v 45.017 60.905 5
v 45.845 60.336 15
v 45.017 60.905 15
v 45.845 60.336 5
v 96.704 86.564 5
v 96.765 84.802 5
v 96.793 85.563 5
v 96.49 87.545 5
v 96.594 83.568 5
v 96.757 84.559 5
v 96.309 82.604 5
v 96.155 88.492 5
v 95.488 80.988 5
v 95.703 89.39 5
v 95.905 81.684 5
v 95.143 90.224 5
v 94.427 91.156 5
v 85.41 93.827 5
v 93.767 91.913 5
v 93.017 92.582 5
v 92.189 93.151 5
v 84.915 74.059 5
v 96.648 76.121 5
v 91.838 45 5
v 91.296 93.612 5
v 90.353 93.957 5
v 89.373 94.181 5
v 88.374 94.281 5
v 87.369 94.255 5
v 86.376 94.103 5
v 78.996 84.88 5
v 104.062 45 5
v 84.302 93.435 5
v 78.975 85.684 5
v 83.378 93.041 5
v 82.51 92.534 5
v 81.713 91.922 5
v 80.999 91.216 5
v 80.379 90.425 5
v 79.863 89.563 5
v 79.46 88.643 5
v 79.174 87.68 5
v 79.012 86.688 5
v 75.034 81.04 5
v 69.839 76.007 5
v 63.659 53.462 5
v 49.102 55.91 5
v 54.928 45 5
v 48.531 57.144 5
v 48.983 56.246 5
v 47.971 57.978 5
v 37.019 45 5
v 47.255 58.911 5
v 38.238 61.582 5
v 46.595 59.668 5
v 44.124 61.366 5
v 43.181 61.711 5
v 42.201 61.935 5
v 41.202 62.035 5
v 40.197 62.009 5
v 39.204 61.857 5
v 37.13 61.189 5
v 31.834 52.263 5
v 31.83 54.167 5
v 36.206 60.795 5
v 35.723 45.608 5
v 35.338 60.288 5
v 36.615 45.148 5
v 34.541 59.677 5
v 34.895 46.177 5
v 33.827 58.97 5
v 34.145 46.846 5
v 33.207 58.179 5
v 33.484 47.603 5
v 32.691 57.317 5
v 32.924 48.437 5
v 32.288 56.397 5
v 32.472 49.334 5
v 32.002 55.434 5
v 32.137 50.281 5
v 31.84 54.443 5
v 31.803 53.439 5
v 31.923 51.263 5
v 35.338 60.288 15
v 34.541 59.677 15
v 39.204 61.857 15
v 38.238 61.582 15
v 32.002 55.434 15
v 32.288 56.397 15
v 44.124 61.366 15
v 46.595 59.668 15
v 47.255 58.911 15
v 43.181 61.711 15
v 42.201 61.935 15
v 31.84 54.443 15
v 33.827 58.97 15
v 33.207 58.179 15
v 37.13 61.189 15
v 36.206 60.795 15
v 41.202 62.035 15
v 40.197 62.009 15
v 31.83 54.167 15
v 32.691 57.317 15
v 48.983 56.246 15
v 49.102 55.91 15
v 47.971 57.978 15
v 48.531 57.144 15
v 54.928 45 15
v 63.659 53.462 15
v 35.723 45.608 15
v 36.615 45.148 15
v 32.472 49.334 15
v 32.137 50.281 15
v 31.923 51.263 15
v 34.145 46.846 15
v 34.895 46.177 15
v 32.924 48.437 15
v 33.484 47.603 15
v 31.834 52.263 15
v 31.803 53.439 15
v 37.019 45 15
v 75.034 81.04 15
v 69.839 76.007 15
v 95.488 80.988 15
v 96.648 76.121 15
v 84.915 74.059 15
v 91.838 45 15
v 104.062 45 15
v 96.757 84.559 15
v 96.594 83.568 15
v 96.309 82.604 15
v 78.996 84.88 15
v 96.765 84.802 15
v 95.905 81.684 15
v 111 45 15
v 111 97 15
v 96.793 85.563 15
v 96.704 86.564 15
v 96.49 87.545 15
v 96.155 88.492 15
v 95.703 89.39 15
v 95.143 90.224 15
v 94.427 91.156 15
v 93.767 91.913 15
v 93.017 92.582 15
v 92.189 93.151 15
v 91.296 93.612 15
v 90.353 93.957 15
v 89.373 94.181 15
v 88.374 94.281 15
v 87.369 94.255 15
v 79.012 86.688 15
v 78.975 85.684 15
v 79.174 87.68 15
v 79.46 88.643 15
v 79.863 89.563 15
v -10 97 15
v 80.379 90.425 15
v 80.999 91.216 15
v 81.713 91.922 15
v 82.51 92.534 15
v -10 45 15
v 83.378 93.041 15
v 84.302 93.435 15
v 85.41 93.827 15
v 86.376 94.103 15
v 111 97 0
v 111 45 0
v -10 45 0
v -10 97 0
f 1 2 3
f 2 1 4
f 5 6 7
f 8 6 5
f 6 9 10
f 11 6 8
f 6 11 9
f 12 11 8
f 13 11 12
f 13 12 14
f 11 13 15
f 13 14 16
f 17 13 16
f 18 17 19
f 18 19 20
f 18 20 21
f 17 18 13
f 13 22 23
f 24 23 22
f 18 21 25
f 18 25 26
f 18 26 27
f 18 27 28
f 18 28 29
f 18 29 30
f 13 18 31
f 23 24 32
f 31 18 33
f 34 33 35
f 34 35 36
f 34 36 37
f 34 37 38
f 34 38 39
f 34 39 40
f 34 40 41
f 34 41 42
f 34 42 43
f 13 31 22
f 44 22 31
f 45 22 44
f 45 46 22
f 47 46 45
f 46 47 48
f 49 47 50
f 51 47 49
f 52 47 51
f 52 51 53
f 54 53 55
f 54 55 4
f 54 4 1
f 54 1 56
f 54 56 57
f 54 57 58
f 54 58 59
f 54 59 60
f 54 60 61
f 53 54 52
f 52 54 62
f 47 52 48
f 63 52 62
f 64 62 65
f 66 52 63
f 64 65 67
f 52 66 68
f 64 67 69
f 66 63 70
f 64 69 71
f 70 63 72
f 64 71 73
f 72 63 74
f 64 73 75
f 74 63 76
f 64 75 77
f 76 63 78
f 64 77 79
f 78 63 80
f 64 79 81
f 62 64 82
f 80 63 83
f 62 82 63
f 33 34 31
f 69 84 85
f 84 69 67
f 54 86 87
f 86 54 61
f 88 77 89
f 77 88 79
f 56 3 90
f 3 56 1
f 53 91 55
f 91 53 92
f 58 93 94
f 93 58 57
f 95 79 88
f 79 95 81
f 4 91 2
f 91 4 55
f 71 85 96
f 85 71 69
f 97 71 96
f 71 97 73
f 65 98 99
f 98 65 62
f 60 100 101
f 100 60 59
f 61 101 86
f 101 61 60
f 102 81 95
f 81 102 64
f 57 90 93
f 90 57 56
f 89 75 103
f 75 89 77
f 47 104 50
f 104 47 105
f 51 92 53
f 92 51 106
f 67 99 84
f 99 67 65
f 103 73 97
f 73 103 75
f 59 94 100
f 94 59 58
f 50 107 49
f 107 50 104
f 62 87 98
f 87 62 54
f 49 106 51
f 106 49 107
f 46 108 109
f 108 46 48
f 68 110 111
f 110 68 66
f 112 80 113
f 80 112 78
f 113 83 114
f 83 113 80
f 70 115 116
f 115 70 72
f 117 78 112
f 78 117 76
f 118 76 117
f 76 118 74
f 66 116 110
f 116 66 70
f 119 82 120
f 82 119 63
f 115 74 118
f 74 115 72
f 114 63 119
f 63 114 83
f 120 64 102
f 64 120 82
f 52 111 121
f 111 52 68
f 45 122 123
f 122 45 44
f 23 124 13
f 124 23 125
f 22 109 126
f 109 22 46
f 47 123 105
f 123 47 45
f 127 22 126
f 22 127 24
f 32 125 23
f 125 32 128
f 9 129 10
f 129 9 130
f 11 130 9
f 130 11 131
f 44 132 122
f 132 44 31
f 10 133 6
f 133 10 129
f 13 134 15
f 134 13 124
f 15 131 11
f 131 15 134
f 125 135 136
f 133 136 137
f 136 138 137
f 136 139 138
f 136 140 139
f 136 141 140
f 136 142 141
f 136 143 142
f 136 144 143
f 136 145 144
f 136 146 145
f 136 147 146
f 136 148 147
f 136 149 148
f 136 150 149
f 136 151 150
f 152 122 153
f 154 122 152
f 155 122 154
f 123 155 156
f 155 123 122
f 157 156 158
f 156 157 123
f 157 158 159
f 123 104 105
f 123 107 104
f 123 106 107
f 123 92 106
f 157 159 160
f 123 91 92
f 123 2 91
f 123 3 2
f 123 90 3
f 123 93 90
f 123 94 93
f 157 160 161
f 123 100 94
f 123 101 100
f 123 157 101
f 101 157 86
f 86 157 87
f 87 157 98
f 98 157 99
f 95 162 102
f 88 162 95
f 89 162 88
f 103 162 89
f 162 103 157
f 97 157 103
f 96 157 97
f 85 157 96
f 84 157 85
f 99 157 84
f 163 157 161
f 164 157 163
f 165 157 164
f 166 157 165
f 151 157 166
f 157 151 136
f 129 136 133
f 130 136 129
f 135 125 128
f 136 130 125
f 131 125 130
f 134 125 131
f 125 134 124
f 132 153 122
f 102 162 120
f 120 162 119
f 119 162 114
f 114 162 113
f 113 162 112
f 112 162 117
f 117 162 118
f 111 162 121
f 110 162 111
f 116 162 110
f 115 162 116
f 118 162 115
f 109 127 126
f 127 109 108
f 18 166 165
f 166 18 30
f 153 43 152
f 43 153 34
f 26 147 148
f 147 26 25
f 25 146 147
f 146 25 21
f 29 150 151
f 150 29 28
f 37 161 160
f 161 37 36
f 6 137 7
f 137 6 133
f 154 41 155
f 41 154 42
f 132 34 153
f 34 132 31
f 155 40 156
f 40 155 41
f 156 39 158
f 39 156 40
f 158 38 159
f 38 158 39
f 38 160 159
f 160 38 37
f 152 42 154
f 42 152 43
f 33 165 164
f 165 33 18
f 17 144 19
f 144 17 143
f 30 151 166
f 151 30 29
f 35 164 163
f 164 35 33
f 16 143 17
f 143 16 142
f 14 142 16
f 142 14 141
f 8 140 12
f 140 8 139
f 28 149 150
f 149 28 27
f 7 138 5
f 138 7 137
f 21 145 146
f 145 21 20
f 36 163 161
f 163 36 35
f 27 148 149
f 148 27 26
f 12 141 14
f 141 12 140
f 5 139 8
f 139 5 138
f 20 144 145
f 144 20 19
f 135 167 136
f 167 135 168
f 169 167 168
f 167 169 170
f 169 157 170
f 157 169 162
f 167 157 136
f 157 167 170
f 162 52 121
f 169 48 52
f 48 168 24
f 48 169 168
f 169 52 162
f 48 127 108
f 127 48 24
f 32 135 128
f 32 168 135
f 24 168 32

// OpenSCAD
difference(){
    
translate([-10,45,0])
cube([121,52,15]);

translate([0,0,5])rotate([0,0,1.5])
minkowski(){
    bogie();
    cylinder(r=1,h=0.001);
}

}

module bogie(){

scale([1,1,2.5]){
$fn=50;

difference(){
cylinder(d=16,h=8);
translate([0,0,-1])cylinder(d=4,h=10);
}
translate([90,83,0])
difference(){
cylinder(d=16,h=8);
//translate([0,0,-1])cylinder(d=4,h=10);
}
translate([108,0,0])
difference(){
cylinder(d=16,h=8);
translate([0,0,-1])cylinder(d=4,h=10);
}
translate([42,52,0])
difference(){
cylinder(d=16,h=8);
//translate([0,0,-1])cylinder(d=4,h=10);
}

translate([3,-5,0])cube([102,10,4]);

rotate([0,0,42.6])
translate([3,-5,0])cube([116,10,4]);

translate([108,0,0])rotate([0,0,101.9])
translate([3,-5,0])cube([78,10,4]);
}

}
